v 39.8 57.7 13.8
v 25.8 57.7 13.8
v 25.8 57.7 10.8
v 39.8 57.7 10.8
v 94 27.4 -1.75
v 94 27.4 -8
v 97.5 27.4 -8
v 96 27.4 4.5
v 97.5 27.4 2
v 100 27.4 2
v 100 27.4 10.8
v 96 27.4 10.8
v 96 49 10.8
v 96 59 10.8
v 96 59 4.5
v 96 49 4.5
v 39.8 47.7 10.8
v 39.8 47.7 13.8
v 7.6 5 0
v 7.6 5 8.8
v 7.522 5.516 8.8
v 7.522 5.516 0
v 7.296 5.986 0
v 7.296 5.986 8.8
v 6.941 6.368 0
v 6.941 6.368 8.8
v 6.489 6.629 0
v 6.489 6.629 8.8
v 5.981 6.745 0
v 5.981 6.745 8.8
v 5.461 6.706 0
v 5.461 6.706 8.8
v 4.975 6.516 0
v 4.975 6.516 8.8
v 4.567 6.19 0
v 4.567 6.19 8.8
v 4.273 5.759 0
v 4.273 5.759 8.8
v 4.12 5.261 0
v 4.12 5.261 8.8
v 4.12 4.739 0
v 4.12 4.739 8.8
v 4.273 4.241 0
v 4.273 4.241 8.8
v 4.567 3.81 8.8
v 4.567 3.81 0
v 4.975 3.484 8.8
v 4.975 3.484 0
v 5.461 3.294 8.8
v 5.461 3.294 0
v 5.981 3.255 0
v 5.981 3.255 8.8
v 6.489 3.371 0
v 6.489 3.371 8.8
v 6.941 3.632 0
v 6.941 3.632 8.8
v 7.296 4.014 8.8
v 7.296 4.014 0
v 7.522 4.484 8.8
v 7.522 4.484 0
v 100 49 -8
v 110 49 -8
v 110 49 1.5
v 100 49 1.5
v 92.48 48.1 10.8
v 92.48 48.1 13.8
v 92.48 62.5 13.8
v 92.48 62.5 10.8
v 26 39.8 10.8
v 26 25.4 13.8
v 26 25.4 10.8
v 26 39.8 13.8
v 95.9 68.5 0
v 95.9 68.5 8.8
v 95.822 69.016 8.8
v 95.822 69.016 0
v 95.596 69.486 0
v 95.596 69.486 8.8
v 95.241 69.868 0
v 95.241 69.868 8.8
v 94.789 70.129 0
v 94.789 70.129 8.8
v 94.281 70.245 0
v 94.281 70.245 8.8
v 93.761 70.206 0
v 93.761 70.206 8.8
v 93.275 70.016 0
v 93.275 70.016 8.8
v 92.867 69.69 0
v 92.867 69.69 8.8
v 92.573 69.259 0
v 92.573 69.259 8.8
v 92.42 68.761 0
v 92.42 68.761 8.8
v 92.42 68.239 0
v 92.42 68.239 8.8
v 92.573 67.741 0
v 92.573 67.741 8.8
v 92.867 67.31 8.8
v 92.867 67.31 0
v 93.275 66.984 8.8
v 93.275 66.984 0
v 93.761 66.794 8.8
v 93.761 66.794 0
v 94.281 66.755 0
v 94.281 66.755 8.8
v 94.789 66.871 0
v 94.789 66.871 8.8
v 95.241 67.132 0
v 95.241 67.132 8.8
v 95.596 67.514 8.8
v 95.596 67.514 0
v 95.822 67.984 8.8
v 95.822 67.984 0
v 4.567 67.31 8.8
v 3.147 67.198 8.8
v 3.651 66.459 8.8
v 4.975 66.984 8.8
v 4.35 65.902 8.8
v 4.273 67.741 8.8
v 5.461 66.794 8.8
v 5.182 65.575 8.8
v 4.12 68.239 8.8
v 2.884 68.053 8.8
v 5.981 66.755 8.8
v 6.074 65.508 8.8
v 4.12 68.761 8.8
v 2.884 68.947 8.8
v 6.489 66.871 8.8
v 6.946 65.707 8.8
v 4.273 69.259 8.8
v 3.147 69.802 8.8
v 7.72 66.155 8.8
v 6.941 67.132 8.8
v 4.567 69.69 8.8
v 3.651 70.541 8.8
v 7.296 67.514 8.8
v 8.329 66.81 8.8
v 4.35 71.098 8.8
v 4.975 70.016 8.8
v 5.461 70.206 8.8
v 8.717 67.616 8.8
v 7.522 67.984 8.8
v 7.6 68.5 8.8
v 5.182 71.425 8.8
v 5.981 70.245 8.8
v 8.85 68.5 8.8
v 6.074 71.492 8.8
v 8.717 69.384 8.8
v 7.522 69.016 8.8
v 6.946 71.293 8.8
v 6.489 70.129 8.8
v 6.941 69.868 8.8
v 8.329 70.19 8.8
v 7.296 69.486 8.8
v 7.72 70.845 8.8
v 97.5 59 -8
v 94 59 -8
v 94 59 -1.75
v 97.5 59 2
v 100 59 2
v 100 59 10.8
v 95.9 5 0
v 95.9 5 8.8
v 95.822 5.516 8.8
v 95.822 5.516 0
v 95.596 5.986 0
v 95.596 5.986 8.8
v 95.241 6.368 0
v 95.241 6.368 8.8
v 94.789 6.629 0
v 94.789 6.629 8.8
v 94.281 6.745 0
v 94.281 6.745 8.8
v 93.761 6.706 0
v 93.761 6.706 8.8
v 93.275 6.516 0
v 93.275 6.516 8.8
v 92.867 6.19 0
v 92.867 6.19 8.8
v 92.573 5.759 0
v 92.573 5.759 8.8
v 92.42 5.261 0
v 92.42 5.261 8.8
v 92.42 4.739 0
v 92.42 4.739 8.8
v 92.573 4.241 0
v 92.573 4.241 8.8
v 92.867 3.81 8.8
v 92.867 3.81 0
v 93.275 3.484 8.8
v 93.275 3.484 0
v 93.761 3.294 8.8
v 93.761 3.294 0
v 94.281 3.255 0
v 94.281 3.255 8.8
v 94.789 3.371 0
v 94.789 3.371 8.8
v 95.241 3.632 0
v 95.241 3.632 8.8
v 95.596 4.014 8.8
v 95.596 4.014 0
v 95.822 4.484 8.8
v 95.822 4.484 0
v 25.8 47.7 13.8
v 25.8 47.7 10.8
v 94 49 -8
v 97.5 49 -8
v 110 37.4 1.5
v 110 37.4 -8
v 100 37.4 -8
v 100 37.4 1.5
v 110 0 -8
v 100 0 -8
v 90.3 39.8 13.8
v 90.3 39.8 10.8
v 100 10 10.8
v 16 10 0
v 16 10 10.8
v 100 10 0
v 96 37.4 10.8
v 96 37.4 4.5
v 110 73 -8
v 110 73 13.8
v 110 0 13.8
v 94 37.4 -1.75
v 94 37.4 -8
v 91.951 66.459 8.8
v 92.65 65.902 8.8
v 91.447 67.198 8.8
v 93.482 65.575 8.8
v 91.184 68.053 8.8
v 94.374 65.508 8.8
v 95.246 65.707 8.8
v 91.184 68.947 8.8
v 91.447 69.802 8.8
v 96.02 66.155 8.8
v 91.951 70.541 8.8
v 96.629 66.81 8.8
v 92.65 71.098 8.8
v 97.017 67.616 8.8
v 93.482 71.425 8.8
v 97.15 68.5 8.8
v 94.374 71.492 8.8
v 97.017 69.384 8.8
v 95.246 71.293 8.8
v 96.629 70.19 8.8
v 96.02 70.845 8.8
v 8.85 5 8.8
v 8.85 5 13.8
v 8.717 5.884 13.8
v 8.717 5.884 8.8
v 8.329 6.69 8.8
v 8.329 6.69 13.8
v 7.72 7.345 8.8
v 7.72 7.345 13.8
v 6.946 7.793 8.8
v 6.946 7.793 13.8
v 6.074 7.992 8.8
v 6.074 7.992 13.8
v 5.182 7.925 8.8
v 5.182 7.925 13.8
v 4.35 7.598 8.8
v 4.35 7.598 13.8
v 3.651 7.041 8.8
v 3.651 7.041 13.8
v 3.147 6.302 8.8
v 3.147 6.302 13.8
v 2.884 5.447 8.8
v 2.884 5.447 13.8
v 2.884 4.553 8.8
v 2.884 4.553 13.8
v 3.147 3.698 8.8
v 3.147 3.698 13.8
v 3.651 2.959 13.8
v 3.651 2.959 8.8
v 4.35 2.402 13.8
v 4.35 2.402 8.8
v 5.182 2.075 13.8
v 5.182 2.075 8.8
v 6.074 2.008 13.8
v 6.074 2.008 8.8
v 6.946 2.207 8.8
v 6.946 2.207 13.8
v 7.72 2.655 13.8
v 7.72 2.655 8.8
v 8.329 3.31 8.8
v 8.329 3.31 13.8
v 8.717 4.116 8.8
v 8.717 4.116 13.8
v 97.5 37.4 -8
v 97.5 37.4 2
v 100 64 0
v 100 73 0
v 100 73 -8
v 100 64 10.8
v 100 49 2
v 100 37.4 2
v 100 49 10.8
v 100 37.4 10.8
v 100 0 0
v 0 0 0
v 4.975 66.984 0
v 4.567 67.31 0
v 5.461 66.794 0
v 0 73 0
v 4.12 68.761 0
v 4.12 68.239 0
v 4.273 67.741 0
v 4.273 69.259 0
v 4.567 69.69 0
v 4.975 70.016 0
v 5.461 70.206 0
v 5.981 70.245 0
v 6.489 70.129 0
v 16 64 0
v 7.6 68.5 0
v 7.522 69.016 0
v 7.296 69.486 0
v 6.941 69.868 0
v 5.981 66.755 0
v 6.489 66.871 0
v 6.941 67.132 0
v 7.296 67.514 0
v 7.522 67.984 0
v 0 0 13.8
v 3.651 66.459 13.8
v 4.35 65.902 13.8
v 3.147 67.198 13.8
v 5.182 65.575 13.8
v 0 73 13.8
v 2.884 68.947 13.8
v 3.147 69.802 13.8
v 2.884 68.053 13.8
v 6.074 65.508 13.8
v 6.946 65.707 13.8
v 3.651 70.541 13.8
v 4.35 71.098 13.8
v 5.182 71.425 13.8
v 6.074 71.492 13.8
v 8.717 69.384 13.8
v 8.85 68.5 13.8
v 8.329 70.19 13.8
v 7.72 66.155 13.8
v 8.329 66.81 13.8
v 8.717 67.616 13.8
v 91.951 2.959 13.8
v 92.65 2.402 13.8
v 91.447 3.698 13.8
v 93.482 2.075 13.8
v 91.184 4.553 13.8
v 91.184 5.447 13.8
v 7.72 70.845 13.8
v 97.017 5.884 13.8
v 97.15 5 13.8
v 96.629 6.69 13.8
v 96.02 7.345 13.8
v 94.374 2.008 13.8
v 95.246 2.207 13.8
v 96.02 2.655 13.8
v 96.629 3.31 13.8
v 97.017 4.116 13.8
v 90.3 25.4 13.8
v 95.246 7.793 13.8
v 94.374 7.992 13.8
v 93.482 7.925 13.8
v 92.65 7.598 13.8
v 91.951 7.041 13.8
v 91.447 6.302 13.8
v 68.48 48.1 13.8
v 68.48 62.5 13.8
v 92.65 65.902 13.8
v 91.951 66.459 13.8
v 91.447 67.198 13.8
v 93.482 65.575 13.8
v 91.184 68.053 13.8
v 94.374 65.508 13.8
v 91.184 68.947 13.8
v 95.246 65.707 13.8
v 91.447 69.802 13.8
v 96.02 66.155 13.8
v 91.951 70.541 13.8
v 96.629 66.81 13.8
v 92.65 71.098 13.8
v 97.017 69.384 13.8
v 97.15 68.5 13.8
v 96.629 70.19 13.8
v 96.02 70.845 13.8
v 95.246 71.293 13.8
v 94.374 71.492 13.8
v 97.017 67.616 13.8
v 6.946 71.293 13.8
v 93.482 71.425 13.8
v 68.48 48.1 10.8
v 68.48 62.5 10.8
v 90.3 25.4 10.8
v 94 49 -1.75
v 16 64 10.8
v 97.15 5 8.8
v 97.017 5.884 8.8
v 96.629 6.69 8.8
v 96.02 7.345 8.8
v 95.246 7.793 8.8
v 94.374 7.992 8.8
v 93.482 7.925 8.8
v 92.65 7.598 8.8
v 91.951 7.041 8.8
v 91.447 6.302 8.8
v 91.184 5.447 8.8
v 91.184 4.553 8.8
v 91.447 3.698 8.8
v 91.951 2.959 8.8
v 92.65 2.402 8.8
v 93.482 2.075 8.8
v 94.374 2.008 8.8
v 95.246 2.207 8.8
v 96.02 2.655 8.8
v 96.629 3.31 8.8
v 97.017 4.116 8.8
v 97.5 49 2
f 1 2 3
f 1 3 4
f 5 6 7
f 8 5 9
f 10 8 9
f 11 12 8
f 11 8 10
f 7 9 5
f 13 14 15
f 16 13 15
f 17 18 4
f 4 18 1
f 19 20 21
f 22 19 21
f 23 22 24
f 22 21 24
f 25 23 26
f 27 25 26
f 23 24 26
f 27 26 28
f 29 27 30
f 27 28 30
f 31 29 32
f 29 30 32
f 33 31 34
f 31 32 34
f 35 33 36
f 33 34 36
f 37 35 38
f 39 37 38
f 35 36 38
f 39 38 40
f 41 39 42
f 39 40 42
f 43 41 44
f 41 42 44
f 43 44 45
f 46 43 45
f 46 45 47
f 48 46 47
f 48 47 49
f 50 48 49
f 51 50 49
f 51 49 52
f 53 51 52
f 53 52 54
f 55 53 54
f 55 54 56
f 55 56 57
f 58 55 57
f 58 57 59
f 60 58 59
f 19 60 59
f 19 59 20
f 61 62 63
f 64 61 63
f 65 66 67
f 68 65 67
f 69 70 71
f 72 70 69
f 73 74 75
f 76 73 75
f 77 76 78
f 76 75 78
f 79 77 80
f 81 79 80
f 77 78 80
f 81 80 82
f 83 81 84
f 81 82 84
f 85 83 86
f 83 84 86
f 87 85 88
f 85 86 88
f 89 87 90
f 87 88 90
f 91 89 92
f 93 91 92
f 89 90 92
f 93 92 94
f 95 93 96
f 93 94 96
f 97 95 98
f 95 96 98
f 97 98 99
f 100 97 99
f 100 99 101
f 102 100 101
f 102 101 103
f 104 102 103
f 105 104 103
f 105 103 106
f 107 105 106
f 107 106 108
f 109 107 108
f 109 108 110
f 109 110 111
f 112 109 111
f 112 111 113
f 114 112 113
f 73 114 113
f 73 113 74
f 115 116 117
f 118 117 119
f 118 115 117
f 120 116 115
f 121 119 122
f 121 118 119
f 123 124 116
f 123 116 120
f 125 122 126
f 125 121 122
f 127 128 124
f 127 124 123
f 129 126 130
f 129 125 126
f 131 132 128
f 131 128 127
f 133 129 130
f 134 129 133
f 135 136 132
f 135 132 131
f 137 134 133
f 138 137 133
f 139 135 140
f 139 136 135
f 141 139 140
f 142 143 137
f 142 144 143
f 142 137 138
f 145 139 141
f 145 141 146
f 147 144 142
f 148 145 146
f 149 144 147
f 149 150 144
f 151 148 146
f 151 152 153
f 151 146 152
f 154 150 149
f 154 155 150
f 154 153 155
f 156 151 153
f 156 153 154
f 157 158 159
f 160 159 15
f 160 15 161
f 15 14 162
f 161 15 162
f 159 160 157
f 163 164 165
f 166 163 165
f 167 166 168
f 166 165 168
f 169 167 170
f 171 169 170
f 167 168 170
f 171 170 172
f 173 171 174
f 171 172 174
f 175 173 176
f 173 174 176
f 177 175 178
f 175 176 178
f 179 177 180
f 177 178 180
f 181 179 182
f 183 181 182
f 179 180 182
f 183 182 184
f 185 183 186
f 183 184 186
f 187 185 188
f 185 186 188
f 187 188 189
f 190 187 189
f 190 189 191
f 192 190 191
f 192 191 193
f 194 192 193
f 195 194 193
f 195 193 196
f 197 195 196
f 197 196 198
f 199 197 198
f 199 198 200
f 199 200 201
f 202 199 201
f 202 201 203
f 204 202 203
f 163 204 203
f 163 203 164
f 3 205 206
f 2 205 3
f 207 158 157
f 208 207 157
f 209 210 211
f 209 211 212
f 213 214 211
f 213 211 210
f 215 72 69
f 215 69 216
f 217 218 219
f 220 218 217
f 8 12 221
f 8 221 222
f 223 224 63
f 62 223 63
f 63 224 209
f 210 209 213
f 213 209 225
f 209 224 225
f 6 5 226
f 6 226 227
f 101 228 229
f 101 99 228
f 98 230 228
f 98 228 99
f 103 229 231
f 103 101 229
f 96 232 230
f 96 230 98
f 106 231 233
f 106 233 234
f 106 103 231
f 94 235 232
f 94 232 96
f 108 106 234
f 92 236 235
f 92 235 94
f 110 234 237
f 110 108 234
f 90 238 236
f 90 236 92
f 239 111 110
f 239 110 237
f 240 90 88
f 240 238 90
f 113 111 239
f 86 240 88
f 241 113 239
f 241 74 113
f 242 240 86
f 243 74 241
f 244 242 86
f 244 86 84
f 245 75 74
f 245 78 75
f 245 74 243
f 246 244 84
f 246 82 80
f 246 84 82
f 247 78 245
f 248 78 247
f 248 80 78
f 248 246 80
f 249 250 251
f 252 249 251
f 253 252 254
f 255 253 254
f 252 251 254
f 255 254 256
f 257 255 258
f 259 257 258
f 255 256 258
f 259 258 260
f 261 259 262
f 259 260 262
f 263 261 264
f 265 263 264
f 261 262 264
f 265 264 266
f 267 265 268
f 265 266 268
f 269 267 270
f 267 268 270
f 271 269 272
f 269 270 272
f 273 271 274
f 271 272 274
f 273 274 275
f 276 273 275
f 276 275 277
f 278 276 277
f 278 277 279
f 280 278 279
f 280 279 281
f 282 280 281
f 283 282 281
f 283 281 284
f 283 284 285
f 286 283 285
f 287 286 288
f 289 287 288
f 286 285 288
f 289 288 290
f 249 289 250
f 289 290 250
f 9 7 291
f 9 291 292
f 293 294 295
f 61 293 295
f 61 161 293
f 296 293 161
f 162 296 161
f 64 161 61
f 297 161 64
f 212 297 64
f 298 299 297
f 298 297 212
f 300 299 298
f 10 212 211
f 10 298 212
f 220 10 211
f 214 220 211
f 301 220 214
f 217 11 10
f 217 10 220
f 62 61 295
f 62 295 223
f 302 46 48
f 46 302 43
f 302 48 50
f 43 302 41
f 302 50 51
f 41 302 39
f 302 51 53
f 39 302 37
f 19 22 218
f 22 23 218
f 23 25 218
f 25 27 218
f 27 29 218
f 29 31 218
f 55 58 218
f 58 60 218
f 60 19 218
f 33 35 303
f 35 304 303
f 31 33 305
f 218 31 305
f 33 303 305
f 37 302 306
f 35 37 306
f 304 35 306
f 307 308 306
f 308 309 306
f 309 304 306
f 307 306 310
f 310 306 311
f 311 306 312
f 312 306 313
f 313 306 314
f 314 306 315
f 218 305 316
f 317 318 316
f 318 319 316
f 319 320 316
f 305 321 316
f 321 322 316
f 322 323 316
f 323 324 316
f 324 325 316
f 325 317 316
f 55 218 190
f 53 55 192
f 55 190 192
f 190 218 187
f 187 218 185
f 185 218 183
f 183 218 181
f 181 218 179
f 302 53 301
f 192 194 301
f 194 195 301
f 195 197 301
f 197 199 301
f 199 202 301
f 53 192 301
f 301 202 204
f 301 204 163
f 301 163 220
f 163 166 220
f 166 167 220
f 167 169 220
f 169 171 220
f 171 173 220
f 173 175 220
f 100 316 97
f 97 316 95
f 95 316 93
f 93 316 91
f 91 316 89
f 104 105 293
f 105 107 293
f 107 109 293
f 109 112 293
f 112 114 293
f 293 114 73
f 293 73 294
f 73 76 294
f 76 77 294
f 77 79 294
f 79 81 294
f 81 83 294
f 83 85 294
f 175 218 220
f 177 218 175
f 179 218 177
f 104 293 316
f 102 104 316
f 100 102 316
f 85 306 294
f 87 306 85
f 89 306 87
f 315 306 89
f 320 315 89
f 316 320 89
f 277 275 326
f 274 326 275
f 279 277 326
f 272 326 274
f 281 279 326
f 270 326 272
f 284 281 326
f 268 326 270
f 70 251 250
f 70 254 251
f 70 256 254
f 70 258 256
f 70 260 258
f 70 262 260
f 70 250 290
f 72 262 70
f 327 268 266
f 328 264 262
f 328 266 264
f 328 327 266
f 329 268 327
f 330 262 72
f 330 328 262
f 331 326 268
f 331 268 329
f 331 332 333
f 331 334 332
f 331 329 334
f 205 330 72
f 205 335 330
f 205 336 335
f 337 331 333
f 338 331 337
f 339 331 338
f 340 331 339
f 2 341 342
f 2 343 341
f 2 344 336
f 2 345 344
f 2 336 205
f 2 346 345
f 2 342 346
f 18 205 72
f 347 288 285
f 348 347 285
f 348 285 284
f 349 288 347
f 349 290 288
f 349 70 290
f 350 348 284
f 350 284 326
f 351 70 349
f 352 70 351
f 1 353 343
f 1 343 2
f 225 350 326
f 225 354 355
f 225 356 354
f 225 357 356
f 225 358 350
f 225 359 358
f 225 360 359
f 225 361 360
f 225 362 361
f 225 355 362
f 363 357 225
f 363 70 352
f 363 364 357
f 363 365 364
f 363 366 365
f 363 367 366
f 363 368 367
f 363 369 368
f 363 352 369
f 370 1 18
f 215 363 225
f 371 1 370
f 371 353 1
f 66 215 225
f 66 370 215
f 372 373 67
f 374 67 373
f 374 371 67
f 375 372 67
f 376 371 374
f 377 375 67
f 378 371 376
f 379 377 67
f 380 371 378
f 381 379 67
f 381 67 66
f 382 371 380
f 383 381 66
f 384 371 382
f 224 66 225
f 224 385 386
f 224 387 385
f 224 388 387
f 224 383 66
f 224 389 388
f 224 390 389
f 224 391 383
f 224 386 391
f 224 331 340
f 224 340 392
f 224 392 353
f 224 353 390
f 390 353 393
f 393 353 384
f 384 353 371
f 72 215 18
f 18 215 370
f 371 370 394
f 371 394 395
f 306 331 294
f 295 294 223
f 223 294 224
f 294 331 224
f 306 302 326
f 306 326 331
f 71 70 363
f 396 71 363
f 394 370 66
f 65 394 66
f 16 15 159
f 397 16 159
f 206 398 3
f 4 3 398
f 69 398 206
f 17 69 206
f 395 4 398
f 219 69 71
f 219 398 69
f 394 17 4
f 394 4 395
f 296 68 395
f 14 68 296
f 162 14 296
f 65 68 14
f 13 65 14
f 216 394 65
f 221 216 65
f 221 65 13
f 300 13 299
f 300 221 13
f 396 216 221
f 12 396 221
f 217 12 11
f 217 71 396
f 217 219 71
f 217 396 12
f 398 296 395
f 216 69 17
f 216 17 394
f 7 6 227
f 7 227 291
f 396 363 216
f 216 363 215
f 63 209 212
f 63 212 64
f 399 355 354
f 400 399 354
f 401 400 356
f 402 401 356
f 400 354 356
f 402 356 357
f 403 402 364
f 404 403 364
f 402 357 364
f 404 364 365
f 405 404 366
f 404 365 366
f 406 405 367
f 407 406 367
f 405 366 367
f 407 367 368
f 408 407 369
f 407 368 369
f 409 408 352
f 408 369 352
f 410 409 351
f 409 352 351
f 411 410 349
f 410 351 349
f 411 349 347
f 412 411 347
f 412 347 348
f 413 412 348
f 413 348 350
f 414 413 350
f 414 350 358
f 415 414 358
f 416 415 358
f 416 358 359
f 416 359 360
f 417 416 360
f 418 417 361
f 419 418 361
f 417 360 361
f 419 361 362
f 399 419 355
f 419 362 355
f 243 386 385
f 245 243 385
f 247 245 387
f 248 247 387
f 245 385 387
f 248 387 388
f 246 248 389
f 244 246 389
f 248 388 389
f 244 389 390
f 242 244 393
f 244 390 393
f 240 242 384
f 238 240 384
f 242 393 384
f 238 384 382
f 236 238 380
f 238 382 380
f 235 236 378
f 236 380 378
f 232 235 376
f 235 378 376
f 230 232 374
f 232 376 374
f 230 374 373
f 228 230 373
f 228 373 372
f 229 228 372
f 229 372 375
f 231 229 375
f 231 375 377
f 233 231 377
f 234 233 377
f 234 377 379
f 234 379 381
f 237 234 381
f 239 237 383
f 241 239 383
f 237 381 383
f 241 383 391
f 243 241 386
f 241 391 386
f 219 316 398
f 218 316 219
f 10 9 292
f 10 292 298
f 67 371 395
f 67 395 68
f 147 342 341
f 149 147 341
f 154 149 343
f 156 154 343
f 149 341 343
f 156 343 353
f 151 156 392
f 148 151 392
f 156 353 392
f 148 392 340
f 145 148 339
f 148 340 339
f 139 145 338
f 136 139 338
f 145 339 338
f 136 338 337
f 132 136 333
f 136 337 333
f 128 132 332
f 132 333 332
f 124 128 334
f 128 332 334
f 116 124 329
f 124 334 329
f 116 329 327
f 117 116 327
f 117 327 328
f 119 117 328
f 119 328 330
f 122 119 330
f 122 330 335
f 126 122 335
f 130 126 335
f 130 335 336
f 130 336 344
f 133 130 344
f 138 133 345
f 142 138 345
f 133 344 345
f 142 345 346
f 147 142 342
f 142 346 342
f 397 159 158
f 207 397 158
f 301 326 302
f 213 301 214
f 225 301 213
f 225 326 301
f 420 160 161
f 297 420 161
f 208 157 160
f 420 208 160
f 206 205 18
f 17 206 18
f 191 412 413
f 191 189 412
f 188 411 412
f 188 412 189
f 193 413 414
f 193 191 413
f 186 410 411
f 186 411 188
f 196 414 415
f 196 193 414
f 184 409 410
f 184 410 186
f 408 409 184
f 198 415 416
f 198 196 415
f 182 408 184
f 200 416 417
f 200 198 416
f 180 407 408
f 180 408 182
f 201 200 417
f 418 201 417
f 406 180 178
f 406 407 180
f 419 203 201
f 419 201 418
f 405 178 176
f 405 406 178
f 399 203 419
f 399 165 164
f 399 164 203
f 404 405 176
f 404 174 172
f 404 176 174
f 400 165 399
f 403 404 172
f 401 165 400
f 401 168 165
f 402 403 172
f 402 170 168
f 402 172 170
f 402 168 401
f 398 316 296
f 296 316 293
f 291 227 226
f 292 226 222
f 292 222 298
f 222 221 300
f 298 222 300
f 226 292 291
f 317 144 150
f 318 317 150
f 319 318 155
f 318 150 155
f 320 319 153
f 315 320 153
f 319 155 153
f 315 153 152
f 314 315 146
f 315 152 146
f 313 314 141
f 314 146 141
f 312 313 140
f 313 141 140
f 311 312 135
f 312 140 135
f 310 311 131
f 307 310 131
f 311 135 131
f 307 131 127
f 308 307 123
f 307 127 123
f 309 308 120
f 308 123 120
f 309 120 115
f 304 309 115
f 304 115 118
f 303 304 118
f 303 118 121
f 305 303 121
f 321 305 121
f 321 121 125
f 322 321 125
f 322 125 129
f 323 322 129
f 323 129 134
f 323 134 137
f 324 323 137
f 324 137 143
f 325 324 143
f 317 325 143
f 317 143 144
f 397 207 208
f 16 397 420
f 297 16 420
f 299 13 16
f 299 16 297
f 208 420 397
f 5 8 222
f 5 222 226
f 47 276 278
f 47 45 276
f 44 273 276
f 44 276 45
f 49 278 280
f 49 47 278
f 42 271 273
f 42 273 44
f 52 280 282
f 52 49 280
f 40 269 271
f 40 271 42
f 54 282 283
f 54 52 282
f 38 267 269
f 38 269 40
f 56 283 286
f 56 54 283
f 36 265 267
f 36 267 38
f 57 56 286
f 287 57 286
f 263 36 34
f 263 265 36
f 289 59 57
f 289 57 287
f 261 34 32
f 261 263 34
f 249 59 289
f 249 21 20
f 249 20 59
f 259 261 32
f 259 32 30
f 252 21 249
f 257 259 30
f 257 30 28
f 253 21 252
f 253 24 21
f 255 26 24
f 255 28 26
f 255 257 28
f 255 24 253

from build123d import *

# Parameters (mm, degrees)
F0_W      = 110
F0_H      = 73
F1_DEPTH  = 13.8
F2_W      = 84
F2_H      = 54
F3_DEPTH  = 10.8
F4_W      = 10
F4_H      = 73
F5_DEPTH  = 8
F6_R      = 1.75
F7_DEPTH  = 25
F8_R      = 3
F9_DEPTH  = 5
F10_W     = 64.3
F10_H     = 14.4
F10_W_2   = 24
F10_W_3   = 14
F10_H_2   = 10
F11_DEPTH = 25
F12_W     = 11.6
F12_H     = 9.5
F13_DEPTH = 25
F15_START = -27.4
F15_DEPTH = 10


# Not quite as in the source:
# - a pattern or mirror of a feature is missing from the dataset's text; its kind, count and spacing are read off the source's solid


with BuildPart() as f1:
    # F0 (on Top) → F1 (new body)
    with BuildSketch(Plane.XY):
        with Locations((55, 36.5)):
            Rectangle(F0_W, F0_H)
    extrude(amount=F1_DEPTH)

    # F2 (on face) → F3 (cut)
    with BuildSketch(Plane(origin=(0, 0, 0), x_dir=(1, 0, 0), z_dir=(0, 0, -1))):
        with Locations((58, -37)):
            Rectangle(F2_W, F2_H)
    extrude(amount=-F3_DEPTH, mode=Mode.SUBTRACT)

    # F4 (on face) → F5 (join)
    with BuildSketch(Plane(origin=(0, 0, 0), x_dir=(1, 0, 0), z_dir=(0, 0, -1))):
        with Locations((105, -36.5)):
            Rectangle(F4_W, F4_H)
    extrude(amount=F5_DEPTH)

    # F6 (on face) → F7 (cut)
    with BuildSketch(Plane.XY.offset(13.8)):
        with Locations((5.85, 5)):
            Circle(F6_R)
        with Locations((94.15, 5)):
            Circle(F6_R)
        with Locations((94.15, 68.5)):
            Circle(F6_R)
        with Locations((5.85, 68.5)):
            Circle(F6_R)
    extrude(amount=-F7_DEPTH, mode=Mode.SUBTRACT)

    # F8 (on face) → F9 (cut)
    with BuildSketch(Plane.XY.offset(13.8)):
        with Locations((5.85, 68.5)):
            Circle(F8_R)
        with Locations((5.85, 5)):
            Circle(F8_R)
        with Locations((94.15, 5)):
            Circle(F8_R)
        with Locations((94.15, 68.5)):
            Circle(F8_R)
    extrude(amount=-F9_DEPTH, mode=Mode.SUBTRACT)

    # F10 (on face) → F11 (cut)
    with BuildSketch(Plane.XY.offset(13.8)):
        with Locations((58.15, 32.6)):
            Rectangle(F10_W, F10_H)
        with Locations((80.48, 55.3)):
            Rectangle(F10_W_2, F10_H)
        with Locations((32.8, 52.7)):
            Rectangle(F10_W_3, F10_H_2)
    extrude(amount=-F11_DEPTH, mode=Mode.SUBTRACT)

    # F12 (on face) → F13 (cut)
    with BuildSketch(Plane.YZ.offset(110)):
        with Locations((43.2, -3.25)):
            Rectangle(F12_W, F12_H)
    extrude(amount=-F13_DEPTH, mode=Mode.SUBTRACT)

    # F14 (on face) → F15 (join)
    with BuildSketch(Plane.XZ.offset(F15_START)):
        Polygon((94, -8), (97.5, -8), (97.5, 2), (100, 2), (100, 4.5), (100, 13.8), (96, 13.8), (96, 4.5), (94, -1.75), align=None)
    f15 = extrude(amount=-F15_DEPTH)

    # F15_copies: F15 across plane
    add(f15.mirror(Plane.ZX.offset(43.2)))


solid = f1.part
